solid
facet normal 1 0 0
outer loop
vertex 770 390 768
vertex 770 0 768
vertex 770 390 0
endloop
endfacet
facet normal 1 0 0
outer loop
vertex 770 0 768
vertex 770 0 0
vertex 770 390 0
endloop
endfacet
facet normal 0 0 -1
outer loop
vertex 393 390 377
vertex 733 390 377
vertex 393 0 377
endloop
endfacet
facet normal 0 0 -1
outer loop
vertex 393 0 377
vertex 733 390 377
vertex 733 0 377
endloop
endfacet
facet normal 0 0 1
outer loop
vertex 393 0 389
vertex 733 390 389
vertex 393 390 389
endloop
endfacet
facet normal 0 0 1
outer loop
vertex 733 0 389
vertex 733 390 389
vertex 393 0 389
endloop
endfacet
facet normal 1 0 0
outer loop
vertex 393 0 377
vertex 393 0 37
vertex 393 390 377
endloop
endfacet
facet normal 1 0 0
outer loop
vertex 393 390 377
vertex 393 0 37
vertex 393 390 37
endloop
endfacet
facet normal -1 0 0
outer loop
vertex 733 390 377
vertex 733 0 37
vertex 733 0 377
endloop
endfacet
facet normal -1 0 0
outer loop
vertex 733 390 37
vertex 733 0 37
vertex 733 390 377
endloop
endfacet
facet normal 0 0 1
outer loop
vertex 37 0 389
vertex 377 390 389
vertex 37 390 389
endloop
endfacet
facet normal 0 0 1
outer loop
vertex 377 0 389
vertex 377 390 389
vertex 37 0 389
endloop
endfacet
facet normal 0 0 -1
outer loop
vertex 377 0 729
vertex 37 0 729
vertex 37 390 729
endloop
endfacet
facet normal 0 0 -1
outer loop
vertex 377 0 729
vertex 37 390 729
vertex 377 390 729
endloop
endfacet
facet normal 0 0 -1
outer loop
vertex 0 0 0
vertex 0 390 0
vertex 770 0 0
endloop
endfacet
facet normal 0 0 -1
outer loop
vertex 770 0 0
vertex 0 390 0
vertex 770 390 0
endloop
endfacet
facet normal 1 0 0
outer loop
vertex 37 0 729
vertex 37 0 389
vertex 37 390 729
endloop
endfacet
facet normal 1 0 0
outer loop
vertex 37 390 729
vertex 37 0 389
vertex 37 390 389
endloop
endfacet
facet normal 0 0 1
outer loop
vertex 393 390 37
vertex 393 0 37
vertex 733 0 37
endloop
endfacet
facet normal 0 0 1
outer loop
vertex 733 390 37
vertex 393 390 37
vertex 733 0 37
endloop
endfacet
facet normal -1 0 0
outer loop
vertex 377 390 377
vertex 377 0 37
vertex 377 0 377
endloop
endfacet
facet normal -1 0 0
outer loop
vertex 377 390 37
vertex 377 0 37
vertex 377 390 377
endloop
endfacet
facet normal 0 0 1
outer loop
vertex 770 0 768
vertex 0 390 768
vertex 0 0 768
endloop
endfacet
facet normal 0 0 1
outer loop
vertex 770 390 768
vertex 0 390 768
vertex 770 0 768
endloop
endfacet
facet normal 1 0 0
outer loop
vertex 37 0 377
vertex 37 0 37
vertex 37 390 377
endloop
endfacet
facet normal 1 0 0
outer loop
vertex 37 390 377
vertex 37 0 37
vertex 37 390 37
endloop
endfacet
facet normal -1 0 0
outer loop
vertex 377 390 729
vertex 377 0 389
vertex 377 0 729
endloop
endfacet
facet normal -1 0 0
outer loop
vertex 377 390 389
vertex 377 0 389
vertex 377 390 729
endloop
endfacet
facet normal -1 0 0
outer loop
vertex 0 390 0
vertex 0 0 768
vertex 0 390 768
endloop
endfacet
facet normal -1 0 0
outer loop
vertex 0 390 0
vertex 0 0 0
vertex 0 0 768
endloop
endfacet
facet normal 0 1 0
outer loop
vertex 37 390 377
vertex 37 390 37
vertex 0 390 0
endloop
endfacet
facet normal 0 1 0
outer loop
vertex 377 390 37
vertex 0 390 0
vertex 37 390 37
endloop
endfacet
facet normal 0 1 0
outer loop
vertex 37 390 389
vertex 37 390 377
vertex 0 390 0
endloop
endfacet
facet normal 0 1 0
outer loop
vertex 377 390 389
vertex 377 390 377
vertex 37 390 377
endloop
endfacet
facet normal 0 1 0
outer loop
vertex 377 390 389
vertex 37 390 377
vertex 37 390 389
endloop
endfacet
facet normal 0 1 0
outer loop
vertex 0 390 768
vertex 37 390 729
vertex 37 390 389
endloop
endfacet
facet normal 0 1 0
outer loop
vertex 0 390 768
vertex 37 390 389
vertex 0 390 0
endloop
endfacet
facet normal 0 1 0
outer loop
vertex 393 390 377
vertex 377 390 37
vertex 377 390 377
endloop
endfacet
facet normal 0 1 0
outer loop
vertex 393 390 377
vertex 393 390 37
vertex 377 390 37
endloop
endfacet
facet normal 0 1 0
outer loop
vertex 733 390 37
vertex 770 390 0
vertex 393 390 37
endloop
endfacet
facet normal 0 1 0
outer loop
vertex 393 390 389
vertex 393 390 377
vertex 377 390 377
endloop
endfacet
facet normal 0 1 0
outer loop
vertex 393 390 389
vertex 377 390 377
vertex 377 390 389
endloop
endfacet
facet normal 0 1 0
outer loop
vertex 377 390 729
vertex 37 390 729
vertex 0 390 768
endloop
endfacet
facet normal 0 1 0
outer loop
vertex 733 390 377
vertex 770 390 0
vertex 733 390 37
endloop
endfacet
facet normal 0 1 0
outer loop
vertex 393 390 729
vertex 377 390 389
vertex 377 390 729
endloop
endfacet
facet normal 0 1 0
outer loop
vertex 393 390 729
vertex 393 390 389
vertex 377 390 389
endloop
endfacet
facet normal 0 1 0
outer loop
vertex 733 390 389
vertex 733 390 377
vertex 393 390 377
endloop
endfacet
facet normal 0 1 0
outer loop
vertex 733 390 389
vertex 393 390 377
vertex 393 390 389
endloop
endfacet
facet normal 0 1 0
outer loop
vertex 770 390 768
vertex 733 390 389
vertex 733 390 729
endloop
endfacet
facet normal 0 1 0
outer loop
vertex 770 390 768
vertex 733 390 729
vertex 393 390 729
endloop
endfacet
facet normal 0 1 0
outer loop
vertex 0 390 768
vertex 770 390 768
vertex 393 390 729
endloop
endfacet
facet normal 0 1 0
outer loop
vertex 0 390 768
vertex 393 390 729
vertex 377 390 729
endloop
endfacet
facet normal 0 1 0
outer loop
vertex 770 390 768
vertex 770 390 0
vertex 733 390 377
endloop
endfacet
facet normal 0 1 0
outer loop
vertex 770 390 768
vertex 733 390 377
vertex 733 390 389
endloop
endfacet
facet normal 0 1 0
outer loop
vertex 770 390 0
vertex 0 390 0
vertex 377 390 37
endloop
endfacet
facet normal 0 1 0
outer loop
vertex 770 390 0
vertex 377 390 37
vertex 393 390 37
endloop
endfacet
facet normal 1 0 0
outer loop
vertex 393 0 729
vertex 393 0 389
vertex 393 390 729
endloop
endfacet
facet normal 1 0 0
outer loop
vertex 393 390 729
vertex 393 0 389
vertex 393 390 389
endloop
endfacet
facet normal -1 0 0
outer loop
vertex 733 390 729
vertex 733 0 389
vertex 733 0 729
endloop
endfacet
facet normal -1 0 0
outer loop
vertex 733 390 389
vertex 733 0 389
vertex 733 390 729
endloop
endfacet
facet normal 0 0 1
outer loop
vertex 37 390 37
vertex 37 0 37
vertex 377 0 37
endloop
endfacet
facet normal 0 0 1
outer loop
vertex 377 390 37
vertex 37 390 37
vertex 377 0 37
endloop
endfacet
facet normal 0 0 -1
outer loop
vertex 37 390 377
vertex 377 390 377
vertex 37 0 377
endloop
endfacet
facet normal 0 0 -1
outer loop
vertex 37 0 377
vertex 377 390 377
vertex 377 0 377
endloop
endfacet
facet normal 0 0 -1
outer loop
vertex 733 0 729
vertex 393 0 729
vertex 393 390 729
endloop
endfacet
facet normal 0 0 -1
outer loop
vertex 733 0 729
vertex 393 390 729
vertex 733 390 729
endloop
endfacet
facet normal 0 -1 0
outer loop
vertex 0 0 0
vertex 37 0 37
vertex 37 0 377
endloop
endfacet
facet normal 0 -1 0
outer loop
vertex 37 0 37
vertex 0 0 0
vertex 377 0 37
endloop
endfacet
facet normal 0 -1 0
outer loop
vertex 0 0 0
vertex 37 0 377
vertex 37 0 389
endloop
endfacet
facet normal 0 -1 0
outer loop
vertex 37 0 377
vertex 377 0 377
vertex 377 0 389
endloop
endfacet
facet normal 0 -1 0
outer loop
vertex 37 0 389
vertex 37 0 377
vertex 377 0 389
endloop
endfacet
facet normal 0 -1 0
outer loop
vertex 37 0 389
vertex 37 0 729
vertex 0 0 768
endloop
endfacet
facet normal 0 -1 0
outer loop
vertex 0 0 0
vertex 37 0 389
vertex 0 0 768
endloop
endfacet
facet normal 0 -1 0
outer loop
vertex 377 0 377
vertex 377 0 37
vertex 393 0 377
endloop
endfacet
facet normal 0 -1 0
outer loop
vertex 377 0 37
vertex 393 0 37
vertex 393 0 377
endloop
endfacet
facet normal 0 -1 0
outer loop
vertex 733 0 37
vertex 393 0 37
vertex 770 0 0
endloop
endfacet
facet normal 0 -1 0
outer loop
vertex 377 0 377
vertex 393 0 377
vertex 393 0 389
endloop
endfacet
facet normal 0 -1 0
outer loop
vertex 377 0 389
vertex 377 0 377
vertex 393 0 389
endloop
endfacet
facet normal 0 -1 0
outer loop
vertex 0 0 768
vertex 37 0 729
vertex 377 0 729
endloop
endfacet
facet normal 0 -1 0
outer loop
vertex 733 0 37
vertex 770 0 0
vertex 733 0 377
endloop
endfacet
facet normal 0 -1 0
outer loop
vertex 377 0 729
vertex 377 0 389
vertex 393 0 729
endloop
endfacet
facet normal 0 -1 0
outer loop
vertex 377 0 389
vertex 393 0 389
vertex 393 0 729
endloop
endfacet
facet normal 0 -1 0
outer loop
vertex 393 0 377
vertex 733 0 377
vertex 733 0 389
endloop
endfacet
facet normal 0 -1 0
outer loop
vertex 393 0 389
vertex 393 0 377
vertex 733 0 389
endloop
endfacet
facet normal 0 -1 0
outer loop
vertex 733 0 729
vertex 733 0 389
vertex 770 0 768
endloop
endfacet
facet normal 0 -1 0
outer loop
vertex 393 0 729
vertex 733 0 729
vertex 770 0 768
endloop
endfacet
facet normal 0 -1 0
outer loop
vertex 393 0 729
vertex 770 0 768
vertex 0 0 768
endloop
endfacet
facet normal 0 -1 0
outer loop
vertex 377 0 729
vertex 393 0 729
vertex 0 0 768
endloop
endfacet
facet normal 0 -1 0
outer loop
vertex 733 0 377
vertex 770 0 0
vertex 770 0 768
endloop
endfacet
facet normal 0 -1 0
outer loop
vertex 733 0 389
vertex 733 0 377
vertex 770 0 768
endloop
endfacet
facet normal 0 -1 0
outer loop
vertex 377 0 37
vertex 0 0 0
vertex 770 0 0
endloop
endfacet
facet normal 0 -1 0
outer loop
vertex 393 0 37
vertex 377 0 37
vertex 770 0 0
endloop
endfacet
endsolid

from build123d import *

# Parameters (mm, degrees)
F0_W     = 770
F0_H     = 390
F1_DEPTH = 37
F2_W     = 37
F2_H     = 390
F2_W_2   = 16
F3_DEPTH = 692
F4_W     = 770
F4_H     = 390
F5_DEPTH = 39
F6_W     = 390
F6_H     = 12
F7_DEPTH = 704


with BuildPart() as f1:
    # F0 (on Top) → F1 (new body)
    with BuildSketch(Plane.XY):
        with Locations((385, 195)):
            Rectangle(F0_W, F0_H)
    extrude(amount=F1_DEPTH)

    # F2 (on face) → F3 (join)
    with BuildSketch(Plane.XY.offset(37)):
        with Locations((18.5, 195)):
            Rectangle(F2_W, F2_H)
        with Locations((751.5, 195)):
            Rectangle(F2_W, F2_H)
        with Locations((385, 195)):
            Rectangle(F2_W_2, F2_H)
    extrude(amount=F3_DEPTH)

    # F4 (on face) → F5 (join)
    with BuildSketch(Plane.XY.offset(729)):
        with Locations((385, 195)):
            Rectangle(F4_W, F4_H)
    extrude(amount=F5_DEPTH)

    # F6 (on face) → F7 (join)
    with BuildSketch(Plane(origin=(733, 0, 0), x_dir=(0, -1, 0), z_dir=(-1, 0, 0))):
        with Locations((-195, 383)):
            Rectangle(F6_W, F6_H)
    extrude(amount=F7_DEPTH)


solid = f1.part
